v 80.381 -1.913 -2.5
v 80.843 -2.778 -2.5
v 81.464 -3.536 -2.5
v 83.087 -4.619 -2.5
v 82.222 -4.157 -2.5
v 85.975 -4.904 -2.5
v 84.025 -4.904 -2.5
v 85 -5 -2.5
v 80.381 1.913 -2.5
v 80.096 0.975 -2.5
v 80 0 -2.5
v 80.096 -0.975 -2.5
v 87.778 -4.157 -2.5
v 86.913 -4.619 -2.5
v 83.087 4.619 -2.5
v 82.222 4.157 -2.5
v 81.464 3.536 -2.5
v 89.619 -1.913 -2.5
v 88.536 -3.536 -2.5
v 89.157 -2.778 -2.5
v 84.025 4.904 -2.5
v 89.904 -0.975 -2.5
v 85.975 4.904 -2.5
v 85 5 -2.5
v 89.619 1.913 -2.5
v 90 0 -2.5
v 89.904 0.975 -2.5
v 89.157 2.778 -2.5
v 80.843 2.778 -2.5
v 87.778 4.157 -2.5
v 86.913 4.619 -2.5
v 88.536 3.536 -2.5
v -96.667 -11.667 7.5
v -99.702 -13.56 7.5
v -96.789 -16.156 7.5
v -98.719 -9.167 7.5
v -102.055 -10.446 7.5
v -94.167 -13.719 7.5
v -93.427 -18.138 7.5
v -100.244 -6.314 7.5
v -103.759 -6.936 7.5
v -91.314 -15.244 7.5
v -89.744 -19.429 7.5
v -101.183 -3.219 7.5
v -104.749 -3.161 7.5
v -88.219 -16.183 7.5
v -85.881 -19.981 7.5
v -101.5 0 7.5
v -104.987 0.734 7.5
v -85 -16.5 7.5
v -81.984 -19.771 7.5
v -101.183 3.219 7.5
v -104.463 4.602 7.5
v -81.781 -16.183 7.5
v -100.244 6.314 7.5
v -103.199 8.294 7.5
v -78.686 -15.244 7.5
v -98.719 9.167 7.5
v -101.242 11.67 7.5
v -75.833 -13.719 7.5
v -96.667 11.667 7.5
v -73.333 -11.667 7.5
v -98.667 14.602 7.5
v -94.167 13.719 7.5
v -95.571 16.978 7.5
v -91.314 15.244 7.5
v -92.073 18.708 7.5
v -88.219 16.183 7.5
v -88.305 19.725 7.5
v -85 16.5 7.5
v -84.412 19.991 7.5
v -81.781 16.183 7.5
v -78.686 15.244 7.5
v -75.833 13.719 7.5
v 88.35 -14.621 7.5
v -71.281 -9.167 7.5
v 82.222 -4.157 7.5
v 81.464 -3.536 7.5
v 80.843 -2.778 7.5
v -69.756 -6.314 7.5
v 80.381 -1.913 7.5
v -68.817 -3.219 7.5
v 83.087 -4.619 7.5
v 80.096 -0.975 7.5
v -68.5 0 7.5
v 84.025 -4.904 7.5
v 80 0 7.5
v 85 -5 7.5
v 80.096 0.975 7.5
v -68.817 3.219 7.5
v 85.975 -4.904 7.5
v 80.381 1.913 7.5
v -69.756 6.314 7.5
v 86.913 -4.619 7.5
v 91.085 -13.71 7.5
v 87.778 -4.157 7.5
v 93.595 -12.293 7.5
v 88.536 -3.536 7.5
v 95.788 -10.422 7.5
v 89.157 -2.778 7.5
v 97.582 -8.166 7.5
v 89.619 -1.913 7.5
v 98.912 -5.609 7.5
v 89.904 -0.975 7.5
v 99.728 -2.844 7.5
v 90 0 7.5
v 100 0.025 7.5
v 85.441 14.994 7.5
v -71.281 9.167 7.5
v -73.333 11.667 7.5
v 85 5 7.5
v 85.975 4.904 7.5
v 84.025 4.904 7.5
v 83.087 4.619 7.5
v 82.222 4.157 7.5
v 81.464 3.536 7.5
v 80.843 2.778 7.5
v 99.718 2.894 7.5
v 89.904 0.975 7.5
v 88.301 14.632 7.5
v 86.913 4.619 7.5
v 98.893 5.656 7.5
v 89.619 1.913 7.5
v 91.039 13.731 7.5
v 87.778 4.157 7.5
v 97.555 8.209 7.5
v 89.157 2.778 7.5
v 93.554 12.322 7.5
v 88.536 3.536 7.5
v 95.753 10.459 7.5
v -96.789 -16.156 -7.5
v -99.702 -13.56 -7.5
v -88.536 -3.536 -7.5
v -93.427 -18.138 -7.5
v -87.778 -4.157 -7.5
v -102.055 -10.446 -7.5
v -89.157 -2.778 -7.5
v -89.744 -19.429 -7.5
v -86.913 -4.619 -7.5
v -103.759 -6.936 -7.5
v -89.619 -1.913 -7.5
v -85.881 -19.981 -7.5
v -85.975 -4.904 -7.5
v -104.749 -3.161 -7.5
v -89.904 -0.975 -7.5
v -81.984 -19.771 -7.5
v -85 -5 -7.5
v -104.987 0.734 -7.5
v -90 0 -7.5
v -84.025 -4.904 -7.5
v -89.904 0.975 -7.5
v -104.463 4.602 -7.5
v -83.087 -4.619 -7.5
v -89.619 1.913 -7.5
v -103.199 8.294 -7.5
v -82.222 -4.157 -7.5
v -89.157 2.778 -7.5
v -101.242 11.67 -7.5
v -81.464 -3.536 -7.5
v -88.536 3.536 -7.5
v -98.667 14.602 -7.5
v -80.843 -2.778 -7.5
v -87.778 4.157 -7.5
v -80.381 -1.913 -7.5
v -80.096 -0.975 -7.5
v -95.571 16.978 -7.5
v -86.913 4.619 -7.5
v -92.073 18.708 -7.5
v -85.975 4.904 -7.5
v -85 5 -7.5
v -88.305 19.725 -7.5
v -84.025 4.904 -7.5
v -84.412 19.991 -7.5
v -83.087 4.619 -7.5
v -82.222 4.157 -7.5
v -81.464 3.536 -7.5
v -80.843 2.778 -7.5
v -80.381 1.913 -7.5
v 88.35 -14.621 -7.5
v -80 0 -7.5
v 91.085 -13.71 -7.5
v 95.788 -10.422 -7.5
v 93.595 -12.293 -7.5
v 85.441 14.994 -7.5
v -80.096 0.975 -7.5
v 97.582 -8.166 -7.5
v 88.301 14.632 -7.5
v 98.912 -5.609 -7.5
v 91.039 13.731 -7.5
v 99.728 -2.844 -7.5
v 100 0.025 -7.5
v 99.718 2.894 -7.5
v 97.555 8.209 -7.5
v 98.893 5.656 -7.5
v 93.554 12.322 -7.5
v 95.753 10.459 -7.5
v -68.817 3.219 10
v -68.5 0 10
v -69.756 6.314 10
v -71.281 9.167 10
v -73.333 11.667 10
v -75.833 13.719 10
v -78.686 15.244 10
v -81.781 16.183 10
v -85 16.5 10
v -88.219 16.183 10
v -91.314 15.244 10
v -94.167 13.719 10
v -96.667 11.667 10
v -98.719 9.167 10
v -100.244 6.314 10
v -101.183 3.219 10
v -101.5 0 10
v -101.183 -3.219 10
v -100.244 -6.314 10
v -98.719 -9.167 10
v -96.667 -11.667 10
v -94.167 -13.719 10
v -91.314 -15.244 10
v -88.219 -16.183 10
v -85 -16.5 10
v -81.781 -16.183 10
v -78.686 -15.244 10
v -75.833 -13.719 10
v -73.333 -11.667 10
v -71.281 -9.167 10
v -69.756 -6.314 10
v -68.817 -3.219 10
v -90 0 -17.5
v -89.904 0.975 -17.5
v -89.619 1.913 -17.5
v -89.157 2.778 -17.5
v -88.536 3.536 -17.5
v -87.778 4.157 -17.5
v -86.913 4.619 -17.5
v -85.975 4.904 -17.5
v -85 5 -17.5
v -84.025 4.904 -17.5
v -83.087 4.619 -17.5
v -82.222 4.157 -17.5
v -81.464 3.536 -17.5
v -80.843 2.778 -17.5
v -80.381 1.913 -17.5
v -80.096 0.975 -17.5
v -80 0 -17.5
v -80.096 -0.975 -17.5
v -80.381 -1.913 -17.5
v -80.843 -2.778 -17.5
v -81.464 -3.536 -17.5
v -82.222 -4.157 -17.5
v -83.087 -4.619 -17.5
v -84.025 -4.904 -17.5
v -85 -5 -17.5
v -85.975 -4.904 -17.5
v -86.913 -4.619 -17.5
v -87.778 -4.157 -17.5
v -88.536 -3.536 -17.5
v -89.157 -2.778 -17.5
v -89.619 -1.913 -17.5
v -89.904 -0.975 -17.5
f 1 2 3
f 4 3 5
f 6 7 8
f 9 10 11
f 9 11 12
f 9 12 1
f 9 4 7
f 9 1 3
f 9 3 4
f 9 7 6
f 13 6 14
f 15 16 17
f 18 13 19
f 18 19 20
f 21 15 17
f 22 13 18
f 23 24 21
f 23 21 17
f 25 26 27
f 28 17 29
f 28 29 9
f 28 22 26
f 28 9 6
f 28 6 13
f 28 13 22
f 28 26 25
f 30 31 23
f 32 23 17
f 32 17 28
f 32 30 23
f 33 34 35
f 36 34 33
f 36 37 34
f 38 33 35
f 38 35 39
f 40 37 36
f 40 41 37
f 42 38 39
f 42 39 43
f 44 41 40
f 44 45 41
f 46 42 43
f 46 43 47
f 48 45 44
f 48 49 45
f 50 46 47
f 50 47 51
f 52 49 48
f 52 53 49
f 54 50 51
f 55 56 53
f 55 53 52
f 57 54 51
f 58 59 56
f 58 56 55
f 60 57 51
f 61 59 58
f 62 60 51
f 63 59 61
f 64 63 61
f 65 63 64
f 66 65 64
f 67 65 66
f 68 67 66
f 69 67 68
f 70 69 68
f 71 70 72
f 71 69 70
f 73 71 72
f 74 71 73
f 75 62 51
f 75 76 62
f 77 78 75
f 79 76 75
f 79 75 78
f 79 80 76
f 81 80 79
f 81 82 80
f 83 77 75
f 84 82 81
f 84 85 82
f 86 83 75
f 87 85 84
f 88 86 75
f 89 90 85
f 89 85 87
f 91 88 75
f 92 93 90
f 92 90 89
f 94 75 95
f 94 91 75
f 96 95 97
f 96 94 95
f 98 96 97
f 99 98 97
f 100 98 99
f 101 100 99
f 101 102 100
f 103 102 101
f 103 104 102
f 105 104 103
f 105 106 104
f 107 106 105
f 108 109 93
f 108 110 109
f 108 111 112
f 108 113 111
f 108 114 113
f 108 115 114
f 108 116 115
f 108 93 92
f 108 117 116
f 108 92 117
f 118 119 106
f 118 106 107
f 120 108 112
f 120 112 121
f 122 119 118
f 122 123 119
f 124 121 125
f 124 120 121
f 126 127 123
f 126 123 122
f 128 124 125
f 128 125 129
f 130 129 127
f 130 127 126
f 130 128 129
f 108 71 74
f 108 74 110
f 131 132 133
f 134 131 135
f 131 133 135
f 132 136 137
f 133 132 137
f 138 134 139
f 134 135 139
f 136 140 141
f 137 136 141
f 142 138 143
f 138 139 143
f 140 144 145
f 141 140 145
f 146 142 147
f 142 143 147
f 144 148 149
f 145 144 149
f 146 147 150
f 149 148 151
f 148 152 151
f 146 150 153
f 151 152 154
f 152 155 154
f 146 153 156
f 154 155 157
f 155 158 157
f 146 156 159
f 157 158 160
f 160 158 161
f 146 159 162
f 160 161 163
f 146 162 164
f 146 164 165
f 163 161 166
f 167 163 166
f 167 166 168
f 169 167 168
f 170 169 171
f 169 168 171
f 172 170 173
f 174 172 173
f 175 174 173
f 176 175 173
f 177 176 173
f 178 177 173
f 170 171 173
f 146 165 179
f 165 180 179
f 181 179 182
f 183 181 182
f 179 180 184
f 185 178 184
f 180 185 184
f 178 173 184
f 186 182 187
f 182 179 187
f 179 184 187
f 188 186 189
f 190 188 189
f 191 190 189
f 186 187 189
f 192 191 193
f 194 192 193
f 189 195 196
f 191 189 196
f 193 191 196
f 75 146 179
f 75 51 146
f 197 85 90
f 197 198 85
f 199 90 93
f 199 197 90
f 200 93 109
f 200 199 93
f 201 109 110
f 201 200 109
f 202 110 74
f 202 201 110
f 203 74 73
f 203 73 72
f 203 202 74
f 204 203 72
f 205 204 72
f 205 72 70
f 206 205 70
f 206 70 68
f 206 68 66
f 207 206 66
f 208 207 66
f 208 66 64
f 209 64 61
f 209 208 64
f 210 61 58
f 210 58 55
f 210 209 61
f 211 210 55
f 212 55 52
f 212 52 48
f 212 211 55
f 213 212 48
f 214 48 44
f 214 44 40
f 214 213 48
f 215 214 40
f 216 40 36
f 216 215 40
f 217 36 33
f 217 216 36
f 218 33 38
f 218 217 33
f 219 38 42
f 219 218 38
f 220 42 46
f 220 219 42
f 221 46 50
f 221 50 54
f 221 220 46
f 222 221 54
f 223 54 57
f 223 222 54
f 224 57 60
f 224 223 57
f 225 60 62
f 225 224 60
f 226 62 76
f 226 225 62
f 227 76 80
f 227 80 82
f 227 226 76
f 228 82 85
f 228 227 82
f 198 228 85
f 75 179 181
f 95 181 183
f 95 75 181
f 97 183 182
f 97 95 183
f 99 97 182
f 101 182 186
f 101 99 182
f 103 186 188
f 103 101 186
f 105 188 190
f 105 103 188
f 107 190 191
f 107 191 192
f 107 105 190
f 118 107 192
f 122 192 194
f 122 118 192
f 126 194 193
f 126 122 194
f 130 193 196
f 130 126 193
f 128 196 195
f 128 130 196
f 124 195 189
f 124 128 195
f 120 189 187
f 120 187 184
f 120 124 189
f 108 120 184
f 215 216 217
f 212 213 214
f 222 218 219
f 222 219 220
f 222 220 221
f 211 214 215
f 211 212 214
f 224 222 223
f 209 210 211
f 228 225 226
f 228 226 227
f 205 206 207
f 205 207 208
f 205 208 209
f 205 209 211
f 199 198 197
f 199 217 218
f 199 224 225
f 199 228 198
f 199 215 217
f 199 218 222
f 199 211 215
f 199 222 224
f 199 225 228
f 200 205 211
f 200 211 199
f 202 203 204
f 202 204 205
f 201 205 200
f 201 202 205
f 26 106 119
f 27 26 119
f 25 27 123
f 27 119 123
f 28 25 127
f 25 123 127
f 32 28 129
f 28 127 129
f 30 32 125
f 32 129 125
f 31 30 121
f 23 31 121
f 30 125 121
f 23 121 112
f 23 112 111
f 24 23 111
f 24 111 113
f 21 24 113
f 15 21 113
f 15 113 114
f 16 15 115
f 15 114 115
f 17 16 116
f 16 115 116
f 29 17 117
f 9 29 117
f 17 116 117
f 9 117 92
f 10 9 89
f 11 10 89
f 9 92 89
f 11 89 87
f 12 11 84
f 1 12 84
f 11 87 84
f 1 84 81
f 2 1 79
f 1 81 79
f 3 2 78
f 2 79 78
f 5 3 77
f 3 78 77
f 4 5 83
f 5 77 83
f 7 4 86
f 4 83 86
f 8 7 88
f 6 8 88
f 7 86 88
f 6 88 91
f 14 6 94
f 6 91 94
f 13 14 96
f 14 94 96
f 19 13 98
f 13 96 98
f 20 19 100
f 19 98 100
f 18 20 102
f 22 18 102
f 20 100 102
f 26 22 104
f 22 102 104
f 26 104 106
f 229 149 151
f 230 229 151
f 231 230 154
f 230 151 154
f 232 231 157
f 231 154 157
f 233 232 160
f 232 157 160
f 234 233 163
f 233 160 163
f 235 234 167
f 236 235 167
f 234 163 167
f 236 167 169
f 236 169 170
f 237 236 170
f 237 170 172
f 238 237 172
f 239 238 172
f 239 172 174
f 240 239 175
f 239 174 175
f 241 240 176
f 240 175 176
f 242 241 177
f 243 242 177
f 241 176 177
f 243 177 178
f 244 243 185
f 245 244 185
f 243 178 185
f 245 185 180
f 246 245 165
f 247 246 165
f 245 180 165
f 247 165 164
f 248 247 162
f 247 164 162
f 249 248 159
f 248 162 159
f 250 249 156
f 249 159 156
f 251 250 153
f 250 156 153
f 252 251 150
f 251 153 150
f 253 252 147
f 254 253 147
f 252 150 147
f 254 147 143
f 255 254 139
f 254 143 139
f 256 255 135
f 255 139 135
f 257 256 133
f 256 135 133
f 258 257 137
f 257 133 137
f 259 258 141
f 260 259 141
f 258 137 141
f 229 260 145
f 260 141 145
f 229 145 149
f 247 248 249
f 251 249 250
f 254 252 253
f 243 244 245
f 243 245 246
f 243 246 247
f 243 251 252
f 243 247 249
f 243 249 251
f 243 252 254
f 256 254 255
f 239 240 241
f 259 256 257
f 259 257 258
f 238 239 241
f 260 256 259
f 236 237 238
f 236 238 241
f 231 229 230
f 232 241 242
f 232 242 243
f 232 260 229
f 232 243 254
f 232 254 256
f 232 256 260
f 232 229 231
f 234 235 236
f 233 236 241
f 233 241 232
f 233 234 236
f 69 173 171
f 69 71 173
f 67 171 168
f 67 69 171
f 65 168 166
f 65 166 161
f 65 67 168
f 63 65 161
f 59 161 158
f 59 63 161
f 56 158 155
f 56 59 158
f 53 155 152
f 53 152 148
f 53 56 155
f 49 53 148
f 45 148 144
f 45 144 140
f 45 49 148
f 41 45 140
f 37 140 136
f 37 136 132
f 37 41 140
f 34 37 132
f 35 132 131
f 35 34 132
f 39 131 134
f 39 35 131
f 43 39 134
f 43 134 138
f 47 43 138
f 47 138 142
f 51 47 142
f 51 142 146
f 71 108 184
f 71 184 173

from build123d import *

# Parameters (mm, degrees)
BOSS_EXTRUDE1_DEPTH = 7.5
SKETCH3_R           = 16.5
BOSS_EXTRUDE2_DEPTH = 2.5
SKETCH6_R           = 5
CUT_EXTRUDE1_DEPTH  = 10
SKETCH7_R           = 5
BOSS_EXTRUDE3_DEPTH = 10


with BuildPart() as part:
    # Sketch1 → Boss-Extrude1 (new body, symmetric)
    with BuildSketch(Plane.XY):
        with BuildLine():
            Line((-81.983854392, -19.771263634), (88.350129521, -14.621102291))
            ThreePointArc((88.350129521, -14.621102291), (99.92815548, 1.466347152), (85.441176471, 14.993510707))
            Line((85.441176471, 14.993510707), (-84.411764706, 19.991347609))
            ThreePointArc((-84.411764706, 19.991347609), (-104.962820533, -1.218932468), (-81.983854392, -19.771263634))
        make_face()
    extrude(amount=BOSS_EXTRUDE1_DEPTH, both=True)

    # Sketch3 → Boss-Extrude2 (add, symmetric)
    with BuildSketch(Plane.XY.offset(7.5)):
        with Locations((-85, 0)):
            Circle(SKETCH3_R)
    extrude(amount=BOSS_EXTRUDE2_DEPTH, both=True)

    # Sketch6 → Cut-Extrude1 (cut)
    with BuildSketch(Plane.XY.offset(7.5)):
        with Locations((85, 0)):
            Circle(SKETCH6_R)
    extrude(amount=-CUT_EXTRUDE1_DEPTH, mode=Mode.SUBTRACT)

    # Sketch7 → Boss-Extrude3 (add)
    with BuildSketch(Plane(origin=(0, 0, -7.5), x_dir=(-1, 0, 0), z_dir=(0, 0, -1))):
        with Locations((85, 0)):
            Circle(SKETCH7_R)
    extrude(amount=BOSS_EXTRUDE3_DEPTH)


solid = part.part
